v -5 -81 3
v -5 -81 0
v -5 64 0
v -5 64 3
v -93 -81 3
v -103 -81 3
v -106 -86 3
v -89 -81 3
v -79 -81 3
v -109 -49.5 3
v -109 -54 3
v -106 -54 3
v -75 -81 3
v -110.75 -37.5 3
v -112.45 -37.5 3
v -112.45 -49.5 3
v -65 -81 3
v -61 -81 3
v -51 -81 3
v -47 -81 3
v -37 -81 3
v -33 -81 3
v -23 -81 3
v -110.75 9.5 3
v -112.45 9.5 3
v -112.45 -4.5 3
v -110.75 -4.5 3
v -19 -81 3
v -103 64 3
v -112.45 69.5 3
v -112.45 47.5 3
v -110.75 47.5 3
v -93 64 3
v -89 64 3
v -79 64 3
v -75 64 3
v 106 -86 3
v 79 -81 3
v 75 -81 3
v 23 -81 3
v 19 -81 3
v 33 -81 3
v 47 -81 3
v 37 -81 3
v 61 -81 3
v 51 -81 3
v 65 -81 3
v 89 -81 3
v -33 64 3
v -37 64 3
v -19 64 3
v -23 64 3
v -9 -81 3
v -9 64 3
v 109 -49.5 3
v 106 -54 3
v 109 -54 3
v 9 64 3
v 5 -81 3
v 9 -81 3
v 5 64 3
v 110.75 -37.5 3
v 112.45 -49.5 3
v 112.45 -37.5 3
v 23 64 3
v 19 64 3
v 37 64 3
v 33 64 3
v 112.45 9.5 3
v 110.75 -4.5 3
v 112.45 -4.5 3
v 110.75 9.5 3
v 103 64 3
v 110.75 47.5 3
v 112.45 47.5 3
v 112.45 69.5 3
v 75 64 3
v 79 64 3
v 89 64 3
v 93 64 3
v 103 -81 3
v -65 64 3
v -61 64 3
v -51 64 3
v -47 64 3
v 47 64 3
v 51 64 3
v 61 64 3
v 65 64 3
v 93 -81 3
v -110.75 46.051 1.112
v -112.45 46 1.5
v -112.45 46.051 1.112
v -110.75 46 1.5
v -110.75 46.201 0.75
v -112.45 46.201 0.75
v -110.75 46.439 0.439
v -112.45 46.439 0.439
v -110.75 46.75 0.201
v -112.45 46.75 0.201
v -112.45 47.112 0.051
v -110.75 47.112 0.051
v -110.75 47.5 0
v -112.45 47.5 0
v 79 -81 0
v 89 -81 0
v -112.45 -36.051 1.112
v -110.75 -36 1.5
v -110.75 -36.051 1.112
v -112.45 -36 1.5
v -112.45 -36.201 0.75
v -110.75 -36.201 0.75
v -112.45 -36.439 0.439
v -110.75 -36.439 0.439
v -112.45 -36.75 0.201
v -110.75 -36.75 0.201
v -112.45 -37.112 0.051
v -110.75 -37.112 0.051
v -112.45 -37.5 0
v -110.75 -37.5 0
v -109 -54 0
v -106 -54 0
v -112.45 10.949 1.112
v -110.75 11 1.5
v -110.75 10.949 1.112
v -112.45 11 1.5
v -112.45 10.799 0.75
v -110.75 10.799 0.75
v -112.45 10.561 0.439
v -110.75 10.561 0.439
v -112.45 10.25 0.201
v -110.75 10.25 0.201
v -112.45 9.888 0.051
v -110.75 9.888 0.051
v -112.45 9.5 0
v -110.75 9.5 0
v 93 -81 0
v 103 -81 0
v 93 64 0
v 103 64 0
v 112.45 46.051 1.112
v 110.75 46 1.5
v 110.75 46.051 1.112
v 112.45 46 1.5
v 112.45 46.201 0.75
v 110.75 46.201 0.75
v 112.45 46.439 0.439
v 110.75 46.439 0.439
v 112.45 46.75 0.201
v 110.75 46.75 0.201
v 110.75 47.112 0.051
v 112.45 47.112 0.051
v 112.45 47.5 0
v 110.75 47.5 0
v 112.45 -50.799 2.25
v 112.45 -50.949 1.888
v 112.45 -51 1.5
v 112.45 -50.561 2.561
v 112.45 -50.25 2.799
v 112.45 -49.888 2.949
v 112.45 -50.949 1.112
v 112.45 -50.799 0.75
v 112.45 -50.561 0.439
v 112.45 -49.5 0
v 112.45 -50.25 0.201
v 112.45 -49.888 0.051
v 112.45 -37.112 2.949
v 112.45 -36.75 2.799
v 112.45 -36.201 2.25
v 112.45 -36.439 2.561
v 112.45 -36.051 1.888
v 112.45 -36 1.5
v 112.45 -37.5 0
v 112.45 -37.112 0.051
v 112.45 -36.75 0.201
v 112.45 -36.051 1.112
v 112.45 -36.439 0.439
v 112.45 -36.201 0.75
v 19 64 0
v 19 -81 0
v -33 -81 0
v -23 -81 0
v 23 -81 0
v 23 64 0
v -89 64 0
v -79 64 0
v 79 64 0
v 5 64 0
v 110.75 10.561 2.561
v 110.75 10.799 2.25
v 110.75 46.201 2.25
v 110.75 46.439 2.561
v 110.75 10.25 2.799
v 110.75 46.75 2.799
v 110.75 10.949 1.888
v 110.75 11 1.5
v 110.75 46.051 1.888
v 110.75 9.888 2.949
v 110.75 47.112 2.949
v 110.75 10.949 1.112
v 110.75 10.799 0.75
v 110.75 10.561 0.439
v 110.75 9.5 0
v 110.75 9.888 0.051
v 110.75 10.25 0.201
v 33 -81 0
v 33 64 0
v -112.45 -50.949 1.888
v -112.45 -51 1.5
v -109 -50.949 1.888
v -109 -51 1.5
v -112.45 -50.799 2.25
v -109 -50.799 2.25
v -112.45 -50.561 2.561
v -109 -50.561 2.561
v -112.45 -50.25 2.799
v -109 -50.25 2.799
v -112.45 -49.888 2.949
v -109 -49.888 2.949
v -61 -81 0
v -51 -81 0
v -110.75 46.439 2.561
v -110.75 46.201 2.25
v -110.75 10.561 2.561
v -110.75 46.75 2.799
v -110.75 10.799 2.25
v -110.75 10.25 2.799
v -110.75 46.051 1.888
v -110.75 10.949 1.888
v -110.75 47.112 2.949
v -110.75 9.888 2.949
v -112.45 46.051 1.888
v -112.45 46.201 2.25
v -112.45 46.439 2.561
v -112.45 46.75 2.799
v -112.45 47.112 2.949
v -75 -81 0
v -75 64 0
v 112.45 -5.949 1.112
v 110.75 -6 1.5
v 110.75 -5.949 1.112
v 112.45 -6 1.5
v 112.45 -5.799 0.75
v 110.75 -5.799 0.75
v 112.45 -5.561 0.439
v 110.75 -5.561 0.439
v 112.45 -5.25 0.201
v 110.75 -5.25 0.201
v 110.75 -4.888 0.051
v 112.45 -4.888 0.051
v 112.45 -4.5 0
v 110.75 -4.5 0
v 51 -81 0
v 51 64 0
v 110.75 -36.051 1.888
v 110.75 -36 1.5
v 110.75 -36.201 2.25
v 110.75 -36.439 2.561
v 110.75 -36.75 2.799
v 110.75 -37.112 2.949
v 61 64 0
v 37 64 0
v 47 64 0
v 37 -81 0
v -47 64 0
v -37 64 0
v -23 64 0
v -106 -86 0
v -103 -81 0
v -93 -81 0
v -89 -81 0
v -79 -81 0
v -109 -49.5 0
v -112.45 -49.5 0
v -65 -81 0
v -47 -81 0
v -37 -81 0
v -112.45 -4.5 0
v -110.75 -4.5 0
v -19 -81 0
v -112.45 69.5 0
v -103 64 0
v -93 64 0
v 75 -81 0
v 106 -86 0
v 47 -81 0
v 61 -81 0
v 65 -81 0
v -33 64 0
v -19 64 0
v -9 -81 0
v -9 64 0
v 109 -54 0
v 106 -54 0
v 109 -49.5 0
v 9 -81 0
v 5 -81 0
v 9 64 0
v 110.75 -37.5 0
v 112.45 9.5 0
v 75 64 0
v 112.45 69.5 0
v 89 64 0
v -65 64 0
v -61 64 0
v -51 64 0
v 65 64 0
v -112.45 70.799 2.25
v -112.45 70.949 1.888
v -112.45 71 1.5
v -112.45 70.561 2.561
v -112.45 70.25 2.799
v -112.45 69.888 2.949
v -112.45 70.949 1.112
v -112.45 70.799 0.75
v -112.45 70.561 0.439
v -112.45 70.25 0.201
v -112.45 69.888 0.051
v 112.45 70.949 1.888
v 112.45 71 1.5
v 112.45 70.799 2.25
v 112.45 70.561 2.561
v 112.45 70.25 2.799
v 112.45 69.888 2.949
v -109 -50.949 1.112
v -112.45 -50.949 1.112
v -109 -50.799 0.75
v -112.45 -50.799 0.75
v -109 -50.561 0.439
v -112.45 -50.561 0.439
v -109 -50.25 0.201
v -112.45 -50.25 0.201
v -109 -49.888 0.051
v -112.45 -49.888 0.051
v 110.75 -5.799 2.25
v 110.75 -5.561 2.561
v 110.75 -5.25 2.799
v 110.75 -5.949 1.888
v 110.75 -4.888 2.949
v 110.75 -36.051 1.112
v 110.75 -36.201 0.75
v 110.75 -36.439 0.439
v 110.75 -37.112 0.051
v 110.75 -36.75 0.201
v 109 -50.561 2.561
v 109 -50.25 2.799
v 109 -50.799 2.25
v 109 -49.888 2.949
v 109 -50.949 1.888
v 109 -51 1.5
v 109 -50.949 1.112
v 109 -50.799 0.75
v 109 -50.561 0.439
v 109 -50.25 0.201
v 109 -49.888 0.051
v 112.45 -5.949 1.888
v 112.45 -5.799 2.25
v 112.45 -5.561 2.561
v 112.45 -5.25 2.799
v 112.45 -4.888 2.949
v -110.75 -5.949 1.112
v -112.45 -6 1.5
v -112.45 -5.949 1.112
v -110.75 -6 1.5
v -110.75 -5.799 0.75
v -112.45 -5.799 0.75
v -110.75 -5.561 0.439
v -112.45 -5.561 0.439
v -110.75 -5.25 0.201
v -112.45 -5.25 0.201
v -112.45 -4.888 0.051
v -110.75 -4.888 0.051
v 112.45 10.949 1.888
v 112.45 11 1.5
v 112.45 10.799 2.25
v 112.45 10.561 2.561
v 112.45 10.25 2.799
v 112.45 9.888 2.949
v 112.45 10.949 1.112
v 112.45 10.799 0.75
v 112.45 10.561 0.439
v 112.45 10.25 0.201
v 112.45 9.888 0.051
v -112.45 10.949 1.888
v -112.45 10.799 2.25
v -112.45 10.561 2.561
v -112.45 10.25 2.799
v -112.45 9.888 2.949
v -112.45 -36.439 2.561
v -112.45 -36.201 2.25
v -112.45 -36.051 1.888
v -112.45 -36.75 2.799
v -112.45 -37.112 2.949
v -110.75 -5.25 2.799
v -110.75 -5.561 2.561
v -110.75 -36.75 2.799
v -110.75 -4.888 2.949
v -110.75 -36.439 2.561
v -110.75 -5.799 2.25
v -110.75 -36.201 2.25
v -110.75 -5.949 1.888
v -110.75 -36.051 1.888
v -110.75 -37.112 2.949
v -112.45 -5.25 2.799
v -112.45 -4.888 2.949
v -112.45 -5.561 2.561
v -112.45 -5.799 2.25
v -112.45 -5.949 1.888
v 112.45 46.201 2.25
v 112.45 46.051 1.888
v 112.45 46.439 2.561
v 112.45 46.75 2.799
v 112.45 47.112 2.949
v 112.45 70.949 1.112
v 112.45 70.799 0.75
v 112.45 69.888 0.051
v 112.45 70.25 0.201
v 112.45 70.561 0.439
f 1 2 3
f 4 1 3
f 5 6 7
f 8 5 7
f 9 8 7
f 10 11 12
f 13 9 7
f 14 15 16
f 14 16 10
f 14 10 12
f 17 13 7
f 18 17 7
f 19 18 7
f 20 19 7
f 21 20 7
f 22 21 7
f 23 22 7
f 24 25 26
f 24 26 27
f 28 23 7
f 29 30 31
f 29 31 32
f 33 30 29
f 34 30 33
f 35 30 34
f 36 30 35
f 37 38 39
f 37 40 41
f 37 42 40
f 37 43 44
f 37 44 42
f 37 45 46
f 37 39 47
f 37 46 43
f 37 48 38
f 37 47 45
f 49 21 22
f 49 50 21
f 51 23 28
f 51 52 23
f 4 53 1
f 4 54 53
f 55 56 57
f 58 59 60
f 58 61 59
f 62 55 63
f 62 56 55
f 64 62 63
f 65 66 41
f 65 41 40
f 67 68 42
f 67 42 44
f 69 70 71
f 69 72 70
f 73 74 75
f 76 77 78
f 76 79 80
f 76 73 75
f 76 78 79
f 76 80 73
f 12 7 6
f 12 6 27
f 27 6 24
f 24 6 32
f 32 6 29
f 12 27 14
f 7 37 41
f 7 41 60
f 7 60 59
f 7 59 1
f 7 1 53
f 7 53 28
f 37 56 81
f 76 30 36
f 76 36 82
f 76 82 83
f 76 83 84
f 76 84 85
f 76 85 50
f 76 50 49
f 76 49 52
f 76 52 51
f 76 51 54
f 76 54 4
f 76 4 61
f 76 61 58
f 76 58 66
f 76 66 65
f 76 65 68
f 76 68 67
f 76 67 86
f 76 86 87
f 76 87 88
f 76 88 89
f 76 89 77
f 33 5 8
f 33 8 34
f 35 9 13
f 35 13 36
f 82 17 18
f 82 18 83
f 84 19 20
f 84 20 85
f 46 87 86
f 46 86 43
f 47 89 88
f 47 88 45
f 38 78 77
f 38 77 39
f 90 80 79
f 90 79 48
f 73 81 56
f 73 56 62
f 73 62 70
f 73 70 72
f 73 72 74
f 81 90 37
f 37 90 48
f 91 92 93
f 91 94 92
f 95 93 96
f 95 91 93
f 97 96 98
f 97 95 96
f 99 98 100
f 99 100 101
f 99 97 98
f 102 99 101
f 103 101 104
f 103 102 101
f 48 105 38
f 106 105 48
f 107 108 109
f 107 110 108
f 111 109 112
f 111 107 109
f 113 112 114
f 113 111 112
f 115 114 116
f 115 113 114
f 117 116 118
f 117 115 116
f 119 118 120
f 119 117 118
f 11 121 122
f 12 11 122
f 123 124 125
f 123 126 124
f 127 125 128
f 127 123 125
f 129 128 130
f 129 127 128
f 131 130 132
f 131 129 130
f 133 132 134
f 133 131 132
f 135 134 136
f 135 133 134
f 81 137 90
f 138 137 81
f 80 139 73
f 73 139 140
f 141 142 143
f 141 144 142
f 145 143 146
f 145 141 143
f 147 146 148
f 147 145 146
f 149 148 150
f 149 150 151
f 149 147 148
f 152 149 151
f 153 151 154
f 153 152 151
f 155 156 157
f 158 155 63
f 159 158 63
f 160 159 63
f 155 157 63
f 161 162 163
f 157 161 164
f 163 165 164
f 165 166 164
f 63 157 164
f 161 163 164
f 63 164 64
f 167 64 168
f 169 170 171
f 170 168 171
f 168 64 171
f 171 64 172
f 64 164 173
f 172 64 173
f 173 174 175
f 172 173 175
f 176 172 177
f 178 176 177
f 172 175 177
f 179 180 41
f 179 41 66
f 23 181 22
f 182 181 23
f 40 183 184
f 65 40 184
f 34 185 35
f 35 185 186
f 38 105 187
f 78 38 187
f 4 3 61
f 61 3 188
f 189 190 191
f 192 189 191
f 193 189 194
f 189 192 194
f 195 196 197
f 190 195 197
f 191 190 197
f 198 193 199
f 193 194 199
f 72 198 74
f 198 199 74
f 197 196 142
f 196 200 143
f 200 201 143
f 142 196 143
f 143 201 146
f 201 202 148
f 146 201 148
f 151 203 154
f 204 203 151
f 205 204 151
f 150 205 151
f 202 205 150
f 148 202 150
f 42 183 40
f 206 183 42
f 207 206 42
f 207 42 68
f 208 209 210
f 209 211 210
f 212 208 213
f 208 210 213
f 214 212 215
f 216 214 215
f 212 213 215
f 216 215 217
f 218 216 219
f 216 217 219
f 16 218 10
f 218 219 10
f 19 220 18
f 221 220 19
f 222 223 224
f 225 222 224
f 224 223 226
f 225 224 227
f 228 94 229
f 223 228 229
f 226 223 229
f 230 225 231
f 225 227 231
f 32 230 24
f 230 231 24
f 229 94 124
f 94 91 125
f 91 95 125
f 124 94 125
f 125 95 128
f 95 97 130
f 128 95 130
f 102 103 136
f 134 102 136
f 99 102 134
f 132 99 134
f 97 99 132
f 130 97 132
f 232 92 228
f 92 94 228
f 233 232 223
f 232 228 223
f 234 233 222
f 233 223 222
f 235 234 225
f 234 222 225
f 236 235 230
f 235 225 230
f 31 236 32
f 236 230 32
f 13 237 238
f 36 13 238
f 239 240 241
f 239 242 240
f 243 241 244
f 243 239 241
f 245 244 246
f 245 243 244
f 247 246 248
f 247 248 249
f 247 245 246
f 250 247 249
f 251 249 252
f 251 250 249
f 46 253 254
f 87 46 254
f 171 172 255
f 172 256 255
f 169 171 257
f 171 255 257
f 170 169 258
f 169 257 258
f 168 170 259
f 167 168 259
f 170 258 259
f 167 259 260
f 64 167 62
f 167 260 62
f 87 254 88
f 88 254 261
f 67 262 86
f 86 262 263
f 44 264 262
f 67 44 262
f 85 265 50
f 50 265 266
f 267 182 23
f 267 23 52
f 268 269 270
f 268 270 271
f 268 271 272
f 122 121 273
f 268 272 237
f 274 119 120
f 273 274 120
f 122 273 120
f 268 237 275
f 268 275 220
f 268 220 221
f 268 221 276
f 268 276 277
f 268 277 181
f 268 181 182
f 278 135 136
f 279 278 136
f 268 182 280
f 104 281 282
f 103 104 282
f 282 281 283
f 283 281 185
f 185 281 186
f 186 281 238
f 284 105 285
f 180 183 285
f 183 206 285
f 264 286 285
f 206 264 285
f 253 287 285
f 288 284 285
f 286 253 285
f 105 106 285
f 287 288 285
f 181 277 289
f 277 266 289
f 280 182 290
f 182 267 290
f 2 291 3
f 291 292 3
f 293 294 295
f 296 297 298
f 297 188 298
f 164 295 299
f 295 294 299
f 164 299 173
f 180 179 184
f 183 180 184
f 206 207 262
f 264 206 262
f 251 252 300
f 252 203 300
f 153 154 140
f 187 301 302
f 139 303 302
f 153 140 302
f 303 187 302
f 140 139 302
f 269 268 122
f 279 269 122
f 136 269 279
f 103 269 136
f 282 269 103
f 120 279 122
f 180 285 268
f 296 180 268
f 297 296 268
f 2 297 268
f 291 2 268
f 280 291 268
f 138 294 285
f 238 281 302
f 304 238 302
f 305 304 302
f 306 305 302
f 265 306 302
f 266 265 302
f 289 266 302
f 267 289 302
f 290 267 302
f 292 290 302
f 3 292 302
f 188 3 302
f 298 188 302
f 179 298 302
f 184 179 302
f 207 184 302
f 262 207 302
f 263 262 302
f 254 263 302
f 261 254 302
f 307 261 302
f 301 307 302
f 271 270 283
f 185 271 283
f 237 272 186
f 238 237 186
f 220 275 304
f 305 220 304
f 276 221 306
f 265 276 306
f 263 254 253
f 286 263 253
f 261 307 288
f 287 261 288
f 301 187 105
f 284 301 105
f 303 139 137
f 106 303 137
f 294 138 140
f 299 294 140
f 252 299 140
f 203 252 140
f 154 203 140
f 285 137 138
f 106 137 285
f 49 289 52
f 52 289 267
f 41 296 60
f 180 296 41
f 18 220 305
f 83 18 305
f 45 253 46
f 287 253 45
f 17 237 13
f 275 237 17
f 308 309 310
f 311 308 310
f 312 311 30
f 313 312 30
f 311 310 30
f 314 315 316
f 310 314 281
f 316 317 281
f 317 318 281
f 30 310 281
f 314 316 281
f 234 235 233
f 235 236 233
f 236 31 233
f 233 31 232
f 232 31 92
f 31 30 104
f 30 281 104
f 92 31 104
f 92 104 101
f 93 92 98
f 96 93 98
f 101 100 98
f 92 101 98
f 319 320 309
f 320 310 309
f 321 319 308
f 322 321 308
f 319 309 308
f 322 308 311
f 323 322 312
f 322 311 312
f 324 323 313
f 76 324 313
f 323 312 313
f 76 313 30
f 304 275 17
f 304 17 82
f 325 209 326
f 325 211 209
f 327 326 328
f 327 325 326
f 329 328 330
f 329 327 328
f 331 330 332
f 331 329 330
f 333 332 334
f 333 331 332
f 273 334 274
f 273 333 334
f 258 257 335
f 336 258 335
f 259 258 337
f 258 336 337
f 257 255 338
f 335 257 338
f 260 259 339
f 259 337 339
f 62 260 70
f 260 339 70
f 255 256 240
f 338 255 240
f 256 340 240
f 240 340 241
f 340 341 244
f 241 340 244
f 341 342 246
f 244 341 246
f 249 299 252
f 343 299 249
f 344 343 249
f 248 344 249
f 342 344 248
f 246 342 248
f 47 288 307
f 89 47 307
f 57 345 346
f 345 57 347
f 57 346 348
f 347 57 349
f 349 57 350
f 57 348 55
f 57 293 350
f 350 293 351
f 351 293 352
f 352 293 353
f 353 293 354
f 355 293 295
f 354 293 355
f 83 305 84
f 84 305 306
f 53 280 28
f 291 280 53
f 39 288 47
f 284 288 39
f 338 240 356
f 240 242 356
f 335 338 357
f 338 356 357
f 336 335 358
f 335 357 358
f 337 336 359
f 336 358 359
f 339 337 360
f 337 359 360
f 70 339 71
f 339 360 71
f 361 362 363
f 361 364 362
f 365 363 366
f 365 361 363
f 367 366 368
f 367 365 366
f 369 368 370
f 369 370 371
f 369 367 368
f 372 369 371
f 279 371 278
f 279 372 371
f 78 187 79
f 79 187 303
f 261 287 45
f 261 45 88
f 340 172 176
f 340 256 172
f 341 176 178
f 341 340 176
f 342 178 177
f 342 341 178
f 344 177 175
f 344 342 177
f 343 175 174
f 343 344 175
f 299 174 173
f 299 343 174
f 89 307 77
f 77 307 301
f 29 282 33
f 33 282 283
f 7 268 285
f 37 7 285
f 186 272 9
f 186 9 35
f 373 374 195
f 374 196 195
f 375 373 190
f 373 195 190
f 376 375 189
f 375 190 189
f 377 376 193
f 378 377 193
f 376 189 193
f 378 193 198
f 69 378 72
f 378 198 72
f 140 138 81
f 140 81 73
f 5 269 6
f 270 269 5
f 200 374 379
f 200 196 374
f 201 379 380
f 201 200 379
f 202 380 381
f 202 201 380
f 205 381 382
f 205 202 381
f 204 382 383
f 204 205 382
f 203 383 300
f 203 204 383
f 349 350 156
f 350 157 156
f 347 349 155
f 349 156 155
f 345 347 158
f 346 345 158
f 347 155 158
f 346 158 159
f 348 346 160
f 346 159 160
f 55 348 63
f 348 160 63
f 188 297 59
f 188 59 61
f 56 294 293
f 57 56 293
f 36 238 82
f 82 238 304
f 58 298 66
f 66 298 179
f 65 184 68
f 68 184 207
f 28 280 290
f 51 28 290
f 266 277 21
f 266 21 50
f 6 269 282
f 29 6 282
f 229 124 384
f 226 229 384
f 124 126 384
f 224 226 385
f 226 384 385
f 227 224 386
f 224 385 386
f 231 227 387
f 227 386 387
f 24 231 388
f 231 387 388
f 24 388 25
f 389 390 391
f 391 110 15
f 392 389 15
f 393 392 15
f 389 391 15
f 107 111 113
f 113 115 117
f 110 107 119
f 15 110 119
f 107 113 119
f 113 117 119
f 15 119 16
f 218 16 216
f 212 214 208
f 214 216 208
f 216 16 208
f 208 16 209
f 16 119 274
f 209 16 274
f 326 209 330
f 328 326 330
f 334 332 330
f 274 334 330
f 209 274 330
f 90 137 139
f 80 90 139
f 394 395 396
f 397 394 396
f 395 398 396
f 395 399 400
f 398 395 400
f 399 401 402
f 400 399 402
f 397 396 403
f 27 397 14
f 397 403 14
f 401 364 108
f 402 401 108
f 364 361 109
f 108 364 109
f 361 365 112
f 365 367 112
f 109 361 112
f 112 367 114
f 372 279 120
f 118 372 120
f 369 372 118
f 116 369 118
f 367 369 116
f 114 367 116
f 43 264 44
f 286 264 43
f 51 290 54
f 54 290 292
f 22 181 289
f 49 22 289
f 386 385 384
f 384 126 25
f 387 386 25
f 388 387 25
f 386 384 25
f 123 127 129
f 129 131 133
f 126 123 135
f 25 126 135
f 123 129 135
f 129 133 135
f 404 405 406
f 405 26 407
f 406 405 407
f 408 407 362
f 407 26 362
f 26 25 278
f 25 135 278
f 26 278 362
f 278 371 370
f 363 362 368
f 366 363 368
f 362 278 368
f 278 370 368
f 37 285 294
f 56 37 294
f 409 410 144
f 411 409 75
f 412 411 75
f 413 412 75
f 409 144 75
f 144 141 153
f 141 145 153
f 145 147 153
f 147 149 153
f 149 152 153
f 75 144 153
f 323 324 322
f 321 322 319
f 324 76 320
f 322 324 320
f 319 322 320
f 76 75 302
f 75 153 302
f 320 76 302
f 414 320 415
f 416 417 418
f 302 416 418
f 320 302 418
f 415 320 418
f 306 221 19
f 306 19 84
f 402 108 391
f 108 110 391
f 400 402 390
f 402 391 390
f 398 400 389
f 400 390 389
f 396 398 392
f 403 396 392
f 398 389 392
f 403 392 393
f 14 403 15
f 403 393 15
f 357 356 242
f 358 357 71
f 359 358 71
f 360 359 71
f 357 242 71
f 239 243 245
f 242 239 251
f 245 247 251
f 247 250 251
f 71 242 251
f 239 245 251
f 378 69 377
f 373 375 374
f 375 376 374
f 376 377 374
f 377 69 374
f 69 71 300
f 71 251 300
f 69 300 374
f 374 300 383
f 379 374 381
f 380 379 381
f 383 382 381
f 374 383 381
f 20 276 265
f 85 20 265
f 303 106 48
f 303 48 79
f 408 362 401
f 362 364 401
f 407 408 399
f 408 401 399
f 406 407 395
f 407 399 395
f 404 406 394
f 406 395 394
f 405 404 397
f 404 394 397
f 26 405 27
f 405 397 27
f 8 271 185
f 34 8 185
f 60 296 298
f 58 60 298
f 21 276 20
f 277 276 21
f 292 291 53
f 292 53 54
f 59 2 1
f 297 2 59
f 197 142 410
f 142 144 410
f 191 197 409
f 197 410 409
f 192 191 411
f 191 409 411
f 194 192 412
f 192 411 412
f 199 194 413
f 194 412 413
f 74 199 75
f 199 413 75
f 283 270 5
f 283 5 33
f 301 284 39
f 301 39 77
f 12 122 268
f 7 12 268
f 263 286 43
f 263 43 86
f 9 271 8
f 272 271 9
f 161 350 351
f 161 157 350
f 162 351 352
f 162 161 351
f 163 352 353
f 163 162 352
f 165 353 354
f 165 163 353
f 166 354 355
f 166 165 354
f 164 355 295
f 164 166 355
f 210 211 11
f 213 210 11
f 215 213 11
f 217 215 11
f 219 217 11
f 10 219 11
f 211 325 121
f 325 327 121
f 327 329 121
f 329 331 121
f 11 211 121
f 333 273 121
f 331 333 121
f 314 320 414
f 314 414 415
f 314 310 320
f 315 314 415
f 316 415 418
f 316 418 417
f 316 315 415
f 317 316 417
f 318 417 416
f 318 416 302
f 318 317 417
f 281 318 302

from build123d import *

# Parameters (mm, degrees)
SKETCH_1_W      = 10
SKETCH_1_H      = 145
EXTRUDE_1_DEPTH = 3
FILLET_1_R      = 1.5


with BuildPart() as part:
    # 草图1 → 凸台-拉伸1 (new body)
    with BuildSketch(Plane.XY):
        Polygon((110.75, 71), (-110.75, 71), (-112.45, 71), (-112.45, 46), (-110.75, 46), (-110.75, 11), (-112.45, 11), (-112.45, -6), (-110.75, -6), (-110.75, -36), (-112.45, -36), (-112.45, -51), (-109, -51), (-109, -54), (-106, -54), (-106, -71), (-106, -86), (106, -86), (106, -71), (106, -54), (109, -54), (109, -51), (112.45, -51), (112.45, -36), (110.75, -36), (110.75, -6), (112.45, -6), (112.45, 11), (110.75, 11), (110.75, 46), (112.45, 46), (112.45, 71), align=None)
        with Locations((0, -8.5)):
            Rectangle(SKETCH_1_W, SKETCH_1_H, mode=Mode.SUBTRACT)
        with Locations((14, -8.5)):
            Rectangle(SKETCH_1_W, SKETCH_1_H, mode=Mode.SUBTRACT)
        with Locations((28, -8.5)):
            Rectangle(SKETCH_1_W, SKETCH_1_H, mode=Mode.SUBTRACT)
        with Locations((42, -8.5)):
            Rectangle(SKETCH_1_W, SKETCH_1_H, mode=Mode.SUBTRACT)
        with Locations((56, -8.5)):
            Rectangle(SKETCH_1_W, SKETCH_1_H, mode=Mode.SUBTRACT)
        with Locations((70, -8.5)):
            Rectangle(SKETCH_1_W, SKETCH_1_H, mode=Mode.SUBTRACT)
        with Locations((84, -8.5)):
            Rectangle(SKETCH_1_W, SKETCH_1_H, mode=Mode.SUBTRACT)
        with Locations((98, -8.5)):
            Rectangle(SKETCH_1_W, SKETCH_1_H, mode=Mode.SUBTRACT)
        with Locations((-14, -8.5)):
            Rectangle(SKETCH_1_W, SKETCH_1_H, mode=Mode.SUBTRACT)
        with Locations((-28, -8.5)):
            Rectangle(SKETCH_1_W, SKETCH_1_H, mode=Mode.SUBTRACT)
        with Locations((-42, -8.5)):
            Rectangle(SKETCH_1_W, SKETCH_1_H, mode=Mode.SUBTRACT)
        with Locations((-56, -8.5)):
            Rectangle(SKETCH_1_W, SKETCH_1_H, mode=Mode.SUBTRACT)
        with Locations((-70, -8.5)):
            Rectangle(SKETCH_1_W, SKETCH_1_H, mode=Mode.SUBTRACT)
        with Locations((-84, -8.5)):
            Rectangle(SKETCH_1_W, SKETCH_1_H, mode=Mode.SUBTRACT)
        with Locations((-98, -8.5)):
            Rectangle(SKETCH_1_W, SKETCH_1_H, mode=Mode.SUBTRACT)
    extrude(amount=EXTRUDE_1_DEPTH)

    # 圆角1
    fillet_1_edges = [part.edges().sort_by_distance(p)[0] for p in [
        (111.6, -6, 3),
        (111.6, -6, 0),
        (110.725, -51, 0),
        (110.725, -51, 3),
        (111.6, -36, 0),
        (111.6, -36, 3),
        (111.6, 11, 3),
        (111.6, 11, 0),
        (111.6, 46, 0),
        (111.6, 46, 3),
        (0, 71, 0),
        (0, 71, 3),
        (-111.6, 11, 0),
        (-111.6, 11, 3),
        (-111.6, -6, 0),
        (-111.6, -6, 3),
        (-111.6, 46, 0),
        (-111.6, 46, 3),
        (-111.6, -36, 0),
        (-111.6, -36, 3),
        (-110.725, -51, 0),
        (-110.725, -51, 3),
    ]]
    fillet(fillet_1_edges, radius=FILLET_1_R - 0.0001)  # a hair under: the kernel refuses the full size


solid = part.part
